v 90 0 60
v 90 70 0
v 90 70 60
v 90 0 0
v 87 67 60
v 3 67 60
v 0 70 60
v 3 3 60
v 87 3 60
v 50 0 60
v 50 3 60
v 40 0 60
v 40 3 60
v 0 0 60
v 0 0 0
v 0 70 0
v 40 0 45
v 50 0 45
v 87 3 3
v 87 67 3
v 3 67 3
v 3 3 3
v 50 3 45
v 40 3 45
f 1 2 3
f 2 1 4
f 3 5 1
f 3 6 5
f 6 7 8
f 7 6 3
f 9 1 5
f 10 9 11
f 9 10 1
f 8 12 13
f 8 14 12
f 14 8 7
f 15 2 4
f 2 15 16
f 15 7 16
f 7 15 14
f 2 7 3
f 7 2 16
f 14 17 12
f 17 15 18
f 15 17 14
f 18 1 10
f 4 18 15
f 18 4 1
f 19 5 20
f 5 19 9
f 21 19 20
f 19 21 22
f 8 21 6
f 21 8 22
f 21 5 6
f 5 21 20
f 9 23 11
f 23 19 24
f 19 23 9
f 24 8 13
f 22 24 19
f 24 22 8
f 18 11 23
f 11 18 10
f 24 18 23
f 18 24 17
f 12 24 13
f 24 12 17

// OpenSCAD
$fn = 32;

// ----------------------------------------------------------------------
// Enclosure box: notch enclosure
// ----------------------------------------------------------------------

// --- parameters (mm) ---
box_l = 90;               // outer length, X
box_w = 70;               // outer width, Y
box_h = 60;               // outer height
wall_t = 3;               // wall thickness
notch_w = 10;             // cable notch width
notch_h = 15;             // cable notch height
fit_tol = 0.1;            // tolerance for press fits, mm
free_tol = 0.3;           // tolerance for clearance fits, mm

inner_h = box_h - wall_t;  // cavity depth
boss_h = inner_h - 2;  // corner boss height

difference() {
  cube([box_l, box_w, box_h]);
  translate([wall_t, wall_t, wall_t])
    cube([box_l - 2 * wall_t, box_w - 2 * wall_t, box_h]);
  translate([box_l / 2 - notch_w / 2, -1, box_h - notch_h])
    cube([notch_w, wall_t + 2, notch_h + 1]);
}
